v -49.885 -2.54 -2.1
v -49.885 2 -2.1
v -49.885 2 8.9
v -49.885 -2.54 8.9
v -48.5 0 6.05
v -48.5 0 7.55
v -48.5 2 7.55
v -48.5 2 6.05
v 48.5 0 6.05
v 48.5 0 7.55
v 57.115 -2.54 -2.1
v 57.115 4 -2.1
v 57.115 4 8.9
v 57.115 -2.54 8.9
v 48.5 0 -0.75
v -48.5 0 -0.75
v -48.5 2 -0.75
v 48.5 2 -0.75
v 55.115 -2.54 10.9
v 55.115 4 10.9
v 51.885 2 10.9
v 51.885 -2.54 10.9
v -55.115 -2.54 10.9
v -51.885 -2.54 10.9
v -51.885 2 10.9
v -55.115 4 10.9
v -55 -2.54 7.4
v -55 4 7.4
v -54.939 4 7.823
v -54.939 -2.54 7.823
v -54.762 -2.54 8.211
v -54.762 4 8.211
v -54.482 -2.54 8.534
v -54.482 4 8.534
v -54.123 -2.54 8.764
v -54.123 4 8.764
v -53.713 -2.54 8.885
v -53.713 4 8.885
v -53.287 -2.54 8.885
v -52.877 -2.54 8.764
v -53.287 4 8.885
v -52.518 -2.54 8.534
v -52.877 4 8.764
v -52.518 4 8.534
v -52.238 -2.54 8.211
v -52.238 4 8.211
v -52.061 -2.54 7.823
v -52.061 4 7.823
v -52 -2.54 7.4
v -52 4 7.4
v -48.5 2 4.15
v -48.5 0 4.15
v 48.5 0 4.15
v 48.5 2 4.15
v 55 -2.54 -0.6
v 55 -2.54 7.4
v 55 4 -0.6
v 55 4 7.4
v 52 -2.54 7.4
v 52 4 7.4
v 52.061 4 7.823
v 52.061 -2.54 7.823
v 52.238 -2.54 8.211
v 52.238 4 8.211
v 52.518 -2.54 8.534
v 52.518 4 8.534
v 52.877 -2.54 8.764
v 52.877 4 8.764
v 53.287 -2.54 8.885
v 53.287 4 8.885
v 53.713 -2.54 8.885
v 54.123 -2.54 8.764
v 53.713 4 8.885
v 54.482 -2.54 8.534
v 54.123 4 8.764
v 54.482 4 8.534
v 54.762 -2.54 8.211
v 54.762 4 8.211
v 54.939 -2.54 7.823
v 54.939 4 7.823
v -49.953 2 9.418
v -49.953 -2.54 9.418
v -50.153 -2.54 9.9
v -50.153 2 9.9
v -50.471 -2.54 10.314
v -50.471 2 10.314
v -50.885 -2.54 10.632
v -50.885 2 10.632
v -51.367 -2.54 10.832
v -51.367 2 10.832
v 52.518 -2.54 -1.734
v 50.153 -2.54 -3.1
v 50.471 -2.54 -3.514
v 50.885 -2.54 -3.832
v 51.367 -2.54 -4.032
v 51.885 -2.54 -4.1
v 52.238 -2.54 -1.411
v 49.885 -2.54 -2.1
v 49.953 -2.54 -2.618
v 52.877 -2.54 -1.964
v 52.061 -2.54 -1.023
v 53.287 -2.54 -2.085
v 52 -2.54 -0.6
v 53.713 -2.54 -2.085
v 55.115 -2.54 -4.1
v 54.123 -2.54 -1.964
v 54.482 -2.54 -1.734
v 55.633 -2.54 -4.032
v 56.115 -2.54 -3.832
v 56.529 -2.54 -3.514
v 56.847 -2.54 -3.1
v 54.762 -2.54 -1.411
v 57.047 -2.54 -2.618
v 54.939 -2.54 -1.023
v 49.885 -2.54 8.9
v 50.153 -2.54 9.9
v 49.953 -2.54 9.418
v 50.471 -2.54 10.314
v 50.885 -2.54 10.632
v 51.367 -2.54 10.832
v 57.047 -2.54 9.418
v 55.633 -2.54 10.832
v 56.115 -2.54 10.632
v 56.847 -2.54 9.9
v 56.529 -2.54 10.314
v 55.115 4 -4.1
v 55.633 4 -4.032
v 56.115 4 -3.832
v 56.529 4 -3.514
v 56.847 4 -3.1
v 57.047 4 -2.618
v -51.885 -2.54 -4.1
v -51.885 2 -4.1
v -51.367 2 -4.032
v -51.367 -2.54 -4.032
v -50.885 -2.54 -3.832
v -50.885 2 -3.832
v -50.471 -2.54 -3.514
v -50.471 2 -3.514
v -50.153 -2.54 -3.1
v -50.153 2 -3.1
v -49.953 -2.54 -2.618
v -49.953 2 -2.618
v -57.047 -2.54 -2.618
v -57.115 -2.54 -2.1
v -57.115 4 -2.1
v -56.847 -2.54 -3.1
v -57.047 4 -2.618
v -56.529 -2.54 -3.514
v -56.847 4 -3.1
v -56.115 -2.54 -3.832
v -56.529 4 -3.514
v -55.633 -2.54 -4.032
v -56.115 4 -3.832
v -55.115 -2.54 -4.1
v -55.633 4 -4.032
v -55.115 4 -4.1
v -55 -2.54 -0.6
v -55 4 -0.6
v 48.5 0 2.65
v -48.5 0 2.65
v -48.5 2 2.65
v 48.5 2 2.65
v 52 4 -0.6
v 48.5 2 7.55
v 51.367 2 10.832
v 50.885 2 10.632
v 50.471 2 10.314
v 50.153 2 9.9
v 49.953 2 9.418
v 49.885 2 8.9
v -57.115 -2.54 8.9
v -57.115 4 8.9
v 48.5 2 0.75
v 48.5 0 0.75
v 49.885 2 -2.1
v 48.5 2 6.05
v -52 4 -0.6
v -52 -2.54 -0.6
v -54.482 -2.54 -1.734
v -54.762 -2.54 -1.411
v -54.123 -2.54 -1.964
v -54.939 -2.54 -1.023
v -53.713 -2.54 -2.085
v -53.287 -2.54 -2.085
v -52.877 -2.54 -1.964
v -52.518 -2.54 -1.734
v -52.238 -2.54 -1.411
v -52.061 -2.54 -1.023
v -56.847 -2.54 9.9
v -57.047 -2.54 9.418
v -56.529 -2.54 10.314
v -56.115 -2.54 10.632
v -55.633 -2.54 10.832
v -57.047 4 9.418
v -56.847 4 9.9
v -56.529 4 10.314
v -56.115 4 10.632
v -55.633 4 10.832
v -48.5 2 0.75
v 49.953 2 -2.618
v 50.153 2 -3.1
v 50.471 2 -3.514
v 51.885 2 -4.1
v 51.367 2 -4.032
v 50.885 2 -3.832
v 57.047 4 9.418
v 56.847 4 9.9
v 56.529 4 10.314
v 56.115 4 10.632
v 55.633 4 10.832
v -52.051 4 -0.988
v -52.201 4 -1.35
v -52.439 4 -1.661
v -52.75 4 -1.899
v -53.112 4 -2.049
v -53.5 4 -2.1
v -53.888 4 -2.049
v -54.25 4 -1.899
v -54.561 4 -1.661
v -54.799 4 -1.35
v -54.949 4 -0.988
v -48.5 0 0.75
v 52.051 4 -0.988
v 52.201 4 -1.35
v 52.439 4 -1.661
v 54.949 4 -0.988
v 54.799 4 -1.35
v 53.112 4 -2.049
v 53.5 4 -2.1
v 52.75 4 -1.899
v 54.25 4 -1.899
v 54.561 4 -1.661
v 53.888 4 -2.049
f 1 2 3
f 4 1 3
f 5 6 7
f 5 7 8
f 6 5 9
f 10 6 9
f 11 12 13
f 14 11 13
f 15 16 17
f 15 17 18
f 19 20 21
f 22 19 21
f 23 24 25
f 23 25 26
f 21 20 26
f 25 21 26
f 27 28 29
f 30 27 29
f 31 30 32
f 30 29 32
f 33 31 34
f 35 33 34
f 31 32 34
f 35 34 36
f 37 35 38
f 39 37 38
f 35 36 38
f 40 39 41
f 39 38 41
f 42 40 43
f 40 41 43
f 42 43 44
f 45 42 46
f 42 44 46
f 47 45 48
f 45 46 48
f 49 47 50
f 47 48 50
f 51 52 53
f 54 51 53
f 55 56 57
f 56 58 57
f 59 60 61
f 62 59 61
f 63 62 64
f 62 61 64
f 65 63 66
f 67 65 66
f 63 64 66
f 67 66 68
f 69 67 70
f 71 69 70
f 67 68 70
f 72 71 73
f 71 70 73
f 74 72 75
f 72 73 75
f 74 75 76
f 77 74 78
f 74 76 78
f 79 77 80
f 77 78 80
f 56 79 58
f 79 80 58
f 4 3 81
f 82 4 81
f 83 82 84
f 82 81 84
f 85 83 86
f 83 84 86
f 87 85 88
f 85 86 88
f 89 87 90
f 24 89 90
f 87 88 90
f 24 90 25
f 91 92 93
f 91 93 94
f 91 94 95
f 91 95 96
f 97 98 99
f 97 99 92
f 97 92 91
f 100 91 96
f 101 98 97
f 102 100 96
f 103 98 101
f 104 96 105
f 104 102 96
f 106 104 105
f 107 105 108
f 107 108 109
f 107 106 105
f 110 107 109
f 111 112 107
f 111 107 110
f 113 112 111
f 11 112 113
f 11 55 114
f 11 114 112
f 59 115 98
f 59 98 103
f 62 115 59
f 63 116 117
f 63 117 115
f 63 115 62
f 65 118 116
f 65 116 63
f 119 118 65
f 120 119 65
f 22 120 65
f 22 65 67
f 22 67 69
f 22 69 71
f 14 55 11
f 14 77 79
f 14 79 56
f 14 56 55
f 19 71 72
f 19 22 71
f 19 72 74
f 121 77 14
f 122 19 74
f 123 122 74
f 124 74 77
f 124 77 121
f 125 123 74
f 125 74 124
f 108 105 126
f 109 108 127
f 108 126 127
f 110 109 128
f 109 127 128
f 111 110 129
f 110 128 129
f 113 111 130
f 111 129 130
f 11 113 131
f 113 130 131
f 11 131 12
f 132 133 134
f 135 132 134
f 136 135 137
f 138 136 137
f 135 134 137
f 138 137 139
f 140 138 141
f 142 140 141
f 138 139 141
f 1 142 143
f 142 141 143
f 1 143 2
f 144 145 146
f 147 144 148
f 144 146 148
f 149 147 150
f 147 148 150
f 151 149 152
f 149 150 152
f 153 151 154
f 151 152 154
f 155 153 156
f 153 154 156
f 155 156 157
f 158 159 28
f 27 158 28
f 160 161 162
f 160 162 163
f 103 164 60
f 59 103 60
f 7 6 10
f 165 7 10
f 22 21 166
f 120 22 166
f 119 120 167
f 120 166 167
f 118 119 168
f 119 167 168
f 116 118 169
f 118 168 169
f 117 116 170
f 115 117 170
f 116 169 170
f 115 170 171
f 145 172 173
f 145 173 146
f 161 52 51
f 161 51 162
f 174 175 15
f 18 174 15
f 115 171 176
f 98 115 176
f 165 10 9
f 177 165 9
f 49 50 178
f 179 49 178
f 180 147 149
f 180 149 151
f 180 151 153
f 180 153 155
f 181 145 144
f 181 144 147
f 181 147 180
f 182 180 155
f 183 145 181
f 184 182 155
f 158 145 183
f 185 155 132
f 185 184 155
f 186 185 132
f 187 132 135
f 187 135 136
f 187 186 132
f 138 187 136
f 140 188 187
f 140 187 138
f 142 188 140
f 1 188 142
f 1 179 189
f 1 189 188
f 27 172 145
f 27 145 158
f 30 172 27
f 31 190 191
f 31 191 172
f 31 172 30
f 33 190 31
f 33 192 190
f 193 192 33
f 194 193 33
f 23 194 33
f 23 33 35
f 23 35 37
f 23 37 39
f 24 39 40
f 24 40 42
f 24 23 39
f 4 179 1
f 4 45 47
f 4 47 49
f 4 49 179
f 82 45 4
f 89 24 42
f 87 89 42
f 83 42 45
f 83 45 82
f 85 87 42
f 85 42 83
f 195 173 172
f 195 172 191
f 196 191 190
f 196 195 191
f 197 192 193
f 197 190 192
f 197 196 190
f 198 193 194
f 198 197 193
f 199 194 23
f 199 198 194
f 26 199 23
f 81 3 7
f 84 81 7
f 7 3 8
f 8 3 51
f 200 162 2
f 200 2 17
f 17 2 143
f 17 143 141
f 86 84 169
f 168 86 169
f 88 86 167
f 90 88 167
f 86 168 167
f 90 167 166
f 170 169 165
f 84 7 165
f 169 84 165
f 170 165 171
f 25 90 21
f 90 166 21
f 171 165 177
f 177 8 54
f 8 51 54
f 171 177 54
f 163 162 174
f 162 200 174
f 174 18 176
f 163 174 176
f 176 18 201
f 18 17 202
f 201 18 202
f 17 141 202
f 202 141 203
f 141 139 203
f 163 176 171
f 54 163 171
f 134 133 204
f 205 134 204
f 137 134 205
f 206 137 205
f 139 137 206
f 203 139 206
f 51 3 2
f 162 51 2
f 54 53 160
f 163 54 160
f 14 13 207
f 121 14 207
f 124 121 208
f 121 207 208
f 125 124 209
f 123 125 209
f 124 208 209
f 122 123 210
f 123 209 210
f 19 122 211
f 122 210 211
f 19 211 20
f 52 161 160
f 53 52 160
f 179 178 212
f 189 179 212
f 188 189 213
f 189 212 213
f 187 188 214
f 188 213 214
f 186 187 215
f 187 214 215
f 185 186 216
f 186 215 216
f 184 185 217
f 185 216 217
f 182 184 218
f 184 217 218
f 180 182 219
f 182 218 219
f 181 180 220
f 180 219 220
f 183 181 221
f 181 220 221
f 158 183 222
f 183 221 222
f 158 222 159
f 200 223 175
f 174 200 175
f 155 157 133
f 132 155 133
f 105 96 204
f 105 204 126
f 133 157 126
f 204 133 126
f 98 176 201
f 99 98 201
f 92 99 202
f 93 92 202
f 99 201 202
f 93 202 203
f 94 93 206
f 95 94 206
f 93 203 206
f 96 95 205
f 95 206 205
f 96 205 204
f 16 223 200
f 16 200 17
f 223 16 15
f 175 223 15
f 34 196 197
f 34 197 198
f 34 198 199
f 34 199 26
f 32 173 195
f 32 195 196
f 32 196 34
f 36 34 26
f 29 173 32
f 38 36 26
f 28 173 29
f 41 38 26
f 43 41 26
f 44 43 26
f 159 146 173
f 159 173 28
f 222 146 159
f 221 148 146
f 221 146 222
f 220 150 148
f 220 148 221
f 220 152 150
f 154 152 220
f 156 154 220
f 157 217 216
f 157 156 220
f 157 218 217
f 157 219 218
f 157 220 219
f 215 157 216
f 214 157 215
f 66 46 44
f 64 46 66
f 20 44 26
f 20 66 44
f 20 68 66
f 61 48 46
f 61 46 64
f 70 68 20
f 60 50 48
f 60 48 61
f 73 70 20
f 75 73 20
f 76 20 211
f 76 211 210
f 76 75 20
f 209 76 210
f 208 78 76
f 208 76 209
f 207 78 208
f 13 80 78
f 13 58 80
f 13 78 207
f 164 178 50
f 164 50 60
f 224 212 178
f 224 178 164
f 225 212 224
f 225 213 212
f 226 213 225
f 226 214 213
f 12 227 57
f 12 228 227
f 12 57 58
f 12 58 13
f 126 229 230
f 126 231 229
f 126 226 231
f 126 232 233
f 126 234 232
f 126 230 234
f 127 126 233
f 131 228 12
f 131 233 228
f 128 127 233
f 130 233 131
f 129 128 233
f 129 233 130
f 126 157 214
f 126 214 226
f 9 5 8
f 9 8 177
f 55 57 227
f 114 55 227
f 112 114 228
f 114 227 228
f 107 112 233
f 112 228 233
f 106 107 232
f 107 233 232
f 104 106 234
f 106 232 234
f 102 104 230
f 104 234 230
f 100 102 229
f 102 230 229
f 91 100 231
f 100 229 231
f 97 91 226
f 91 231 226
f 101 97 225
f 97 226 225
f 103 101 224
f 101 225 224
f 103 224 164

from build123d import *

# Parameters (mm, degrees)
SKETCH_1_W          = 97
SKETCH_1_H          = 1.5
EXTRUDE_1_DEPTH     = 2
EXTRUDE_1_2_DEPTH   = 2
EXTRUDE_1_3_DEPTH   = 2
SKETCH_2_W          = 114.23
SKETCH_2_H          = 15
EXTRUDE_2_DEPTH     = 2
CUT_EXTRUDE_1_DEPTH = 10
FILLET_1_R          = 2
EXTRUDE_3_DEPTH     = 4.54


with BuildPart() as part:
    # 草图1 → 凸台-拉伸1 (new body)
    with BuildSketch(Plane(origin=(0, 0, 0), x_dir=(1, 0, 0), z_dir=(0, 1, 0))):
        Rectangle(SKETCH_1_W, SKETCH_1_H)
    extrude(amount=EXTRUDE_1_DEPTH)



with BuildPart() as body_2:
    # 草图1 → Extrude 1 2 (new body)
    with BuildSketch(Plane(origin=(0, 0, 0), x_dir=(1, 0, 0), z_dir=(0, 1, 0))):
        with Locations((0, -3.4)):
            Rectangle(SKETCH_1_W, SKETCH_1_H)
    extrude(amount=EXTRUDE_1_2_DEPTH)


with BuildPart() as body_3:
    # 草图1 → Extrude 1 3 (new body)
    with BuildSketch(Plane(origin=(0, 0, 0), x_dir=(1, 0, 0), z_dir=(0, 1, 0))):
        with Locations((0, -6.8)):
            Rectangle(SKETCH_1_W, SKETCH_1_H)
    extrude(amount=EXTRUDE_1_3_DEPTH)


with BuildPart() as part_1:
    add(part.part)

    add(body_2.part)  # 凸台-拉伸2 merges body 2

    add(body_3.part)  # 凸台-拉伸2 merges body 3
    # 草图2 → 凸台-拉伸2 (add)
    with BuildSketch(Plane(origin=(0, 2, 0), x_dir=(1, 0, 0), z_dir=(0, 1, 0))):
        with Locations((0, -3.4)):
            Rectangle(SKETCH_2_W, SKETCH_2_H)
    extrude(amount=EXTRUDE_2_DEPTH)

    # 草图3 → 切除-拉伸1 (cut)
    with BuildSketch(Plane(origin=(0, 4, 0), x_dir=(1, 0, 0), z_dir=(0, 1, 0))):
        with BuildLine():
            Line((-53.5, 2.1), (-53.5, -3.4))
            Line((-53.5, -3.4), (-52, -3.4))
            Line((-52, -3.4), (-52, 0.6))
            ThreePointArc((-52, 0.6), (-52.439339828, 1.660660172), (-53.5, 2.1))
        make_face()
        with BuildLine():
            Line((-55, 0.6), (-55, -3.4))
            Line((-55, -3.4), (-53.5, -3.4))
            Line((-53.5, -3.4), (-53.5, 2.1))
            ThreePointArc((-53.5, 2.1), (-54.560660172, 1.660660172), (-55, 0.6))
        make_face()
        with BuildLine():
            Line((-53.5, -3.4), (-55, -3.4))
            Line((-55, -3.4), (-55, -7.4))
            ThreePointArc((-55, -7.4), (-53.5, -8.9), (-52, -7.4))
            Line((-52, -7.4), (-52, -3.4))
            Line((-52, -3.4), (-53.5, -3.4))
        make_face()
        with BuildLine():
            Line((53.5, -3.4), (52, -3.4))
            Line((52, -3.4), (52, -7.4))
            ThreePointArc((52, -7.4), (53.5, -8.9), (55, -7.4))
            Line((55, -7.4), (55, -3.4))
            Line((55, -3.4), (53.5, -3.4))
        make_face()
        with BuildLine():
            Line((53.5, 2.1), (53.5, -3.4))
            Line((53.5, -3.4), (55, -3.4))
            Line((55, -3.4), (55, 0.6))
            ThreePointArc((55, 0.6), (54.560660172, 1.660660172), (53.5, 2.1))
        make_face()
        with BuildLine():
            Line((52, 0.6), (52, -3.4))
            Line((52, -3.4), (53.5, -3.4))
            Line((53.5, -3.4), (53.5, 2.1))
            ThreePointArc((53.5, 2.1), (52.439339828, 1.660660172), (52, 0.6))
        make_face()
    extrude(amount=-CUT_EXTRUDE_1_DEPTH, mode=Mode.SUBTRACT)

    # 圆角1
    fillet_1_edges = [part_1.edges().sort_by_distance(p)[0] for p in [
        (57.115, 3, 10.9),
        (57.115, 3, -4.1),
        (-57.115, 3, -4.1),
        (-57.115, 3, 10.9),
    ]]
    fillet(fillet_1_edges, radius=FILLET_1_R)

    # 草图4 → 凸台-拉伸3 (add)
    # profile 1 of 2: a face of its own
    with BuildSketch(Plane.XZ.offset(-2)):
        with BuildLine():
            Line((55.115, 10.9), (51.885, 10.9))
            ThreePointArc((51.885, 10.9), (50.470786438, 10.314213562), (49.885, 8.9))
            Line((49.885, 8.9), (49.885, -2.1))
            ThreePointArc((49.885, -2.1), (50.470786438, -3.514213562), (51.885, -4.1))
            Line((51.885, -4.1), (55.115, -4.1))
            ThreePointArc((55.115, -4.1), (56.529213562, -3.514213562), (57.115, -2.1))
            Line((57.115, -2.1), (57.115, 8.9))
            ThreePointArc((57.115, 8.9), (56.529213562, 10.314213562), (55.115, 10.9))
        make_face()
        with BuildLine():
            Line((55, 7.4), (55, -0.6))
            ThreePointArc((55, -0.6), (53.5, -2.1), (52, -0.6))
            Line((52, -0.6), (52, 7.4))
            ThreePointArc((52, 7.4), (53.5, 8.9), (55, 7.4))
        make_face(mode=Mode.SUBTRACT)
    # profile 2 of 2: a face of its own
    with BuildSketch(Plane.XZ.offset(-2)):
        with BuildLine():
            Line((-49.885, -2.1), (-49.885, 8.9))
            ThreePointArc((-49.885, 8.9), (-50.470786438, 10.314213562), (-51.885, 10.9))
            Line((-51.885, 10.9), (-55.115, 10.9))
            ThreePointArc((-55.115, 10.9), (-56.529213562, 10.314213562), (-57.115, 8.9))
            Line((-57.115, 8.9), (-57.115, -2.1))
            ThreePointArc((-57.115, -2.1), (-56.529213562, -3.514213562), (-55.115, -4.1))
            Line((-55.115, -4.1), (-51.885, -4.1))
            ThreePointArc((-51.885, -4.1), (-50.470786438, -3.514213562), (-49.885, -2.1))
        make_face()
        with BuildLine():
            ThreePointArc((-55, 7.4), (-53.5, 8.9), (-52, 7.4))
            Line((-52, 7.4), (-52, -0.6))
            ThreePointArc((-52, -0.6), (-53.5, -2.1), (-55, -0.6))
            Line((-55, -0.6), (-55, 7.4))
        make_face(mode=Mode.SUBTRACT)
    extrude(amount=EXTRUDE_3_DEPTH)


solid = part_1.part
